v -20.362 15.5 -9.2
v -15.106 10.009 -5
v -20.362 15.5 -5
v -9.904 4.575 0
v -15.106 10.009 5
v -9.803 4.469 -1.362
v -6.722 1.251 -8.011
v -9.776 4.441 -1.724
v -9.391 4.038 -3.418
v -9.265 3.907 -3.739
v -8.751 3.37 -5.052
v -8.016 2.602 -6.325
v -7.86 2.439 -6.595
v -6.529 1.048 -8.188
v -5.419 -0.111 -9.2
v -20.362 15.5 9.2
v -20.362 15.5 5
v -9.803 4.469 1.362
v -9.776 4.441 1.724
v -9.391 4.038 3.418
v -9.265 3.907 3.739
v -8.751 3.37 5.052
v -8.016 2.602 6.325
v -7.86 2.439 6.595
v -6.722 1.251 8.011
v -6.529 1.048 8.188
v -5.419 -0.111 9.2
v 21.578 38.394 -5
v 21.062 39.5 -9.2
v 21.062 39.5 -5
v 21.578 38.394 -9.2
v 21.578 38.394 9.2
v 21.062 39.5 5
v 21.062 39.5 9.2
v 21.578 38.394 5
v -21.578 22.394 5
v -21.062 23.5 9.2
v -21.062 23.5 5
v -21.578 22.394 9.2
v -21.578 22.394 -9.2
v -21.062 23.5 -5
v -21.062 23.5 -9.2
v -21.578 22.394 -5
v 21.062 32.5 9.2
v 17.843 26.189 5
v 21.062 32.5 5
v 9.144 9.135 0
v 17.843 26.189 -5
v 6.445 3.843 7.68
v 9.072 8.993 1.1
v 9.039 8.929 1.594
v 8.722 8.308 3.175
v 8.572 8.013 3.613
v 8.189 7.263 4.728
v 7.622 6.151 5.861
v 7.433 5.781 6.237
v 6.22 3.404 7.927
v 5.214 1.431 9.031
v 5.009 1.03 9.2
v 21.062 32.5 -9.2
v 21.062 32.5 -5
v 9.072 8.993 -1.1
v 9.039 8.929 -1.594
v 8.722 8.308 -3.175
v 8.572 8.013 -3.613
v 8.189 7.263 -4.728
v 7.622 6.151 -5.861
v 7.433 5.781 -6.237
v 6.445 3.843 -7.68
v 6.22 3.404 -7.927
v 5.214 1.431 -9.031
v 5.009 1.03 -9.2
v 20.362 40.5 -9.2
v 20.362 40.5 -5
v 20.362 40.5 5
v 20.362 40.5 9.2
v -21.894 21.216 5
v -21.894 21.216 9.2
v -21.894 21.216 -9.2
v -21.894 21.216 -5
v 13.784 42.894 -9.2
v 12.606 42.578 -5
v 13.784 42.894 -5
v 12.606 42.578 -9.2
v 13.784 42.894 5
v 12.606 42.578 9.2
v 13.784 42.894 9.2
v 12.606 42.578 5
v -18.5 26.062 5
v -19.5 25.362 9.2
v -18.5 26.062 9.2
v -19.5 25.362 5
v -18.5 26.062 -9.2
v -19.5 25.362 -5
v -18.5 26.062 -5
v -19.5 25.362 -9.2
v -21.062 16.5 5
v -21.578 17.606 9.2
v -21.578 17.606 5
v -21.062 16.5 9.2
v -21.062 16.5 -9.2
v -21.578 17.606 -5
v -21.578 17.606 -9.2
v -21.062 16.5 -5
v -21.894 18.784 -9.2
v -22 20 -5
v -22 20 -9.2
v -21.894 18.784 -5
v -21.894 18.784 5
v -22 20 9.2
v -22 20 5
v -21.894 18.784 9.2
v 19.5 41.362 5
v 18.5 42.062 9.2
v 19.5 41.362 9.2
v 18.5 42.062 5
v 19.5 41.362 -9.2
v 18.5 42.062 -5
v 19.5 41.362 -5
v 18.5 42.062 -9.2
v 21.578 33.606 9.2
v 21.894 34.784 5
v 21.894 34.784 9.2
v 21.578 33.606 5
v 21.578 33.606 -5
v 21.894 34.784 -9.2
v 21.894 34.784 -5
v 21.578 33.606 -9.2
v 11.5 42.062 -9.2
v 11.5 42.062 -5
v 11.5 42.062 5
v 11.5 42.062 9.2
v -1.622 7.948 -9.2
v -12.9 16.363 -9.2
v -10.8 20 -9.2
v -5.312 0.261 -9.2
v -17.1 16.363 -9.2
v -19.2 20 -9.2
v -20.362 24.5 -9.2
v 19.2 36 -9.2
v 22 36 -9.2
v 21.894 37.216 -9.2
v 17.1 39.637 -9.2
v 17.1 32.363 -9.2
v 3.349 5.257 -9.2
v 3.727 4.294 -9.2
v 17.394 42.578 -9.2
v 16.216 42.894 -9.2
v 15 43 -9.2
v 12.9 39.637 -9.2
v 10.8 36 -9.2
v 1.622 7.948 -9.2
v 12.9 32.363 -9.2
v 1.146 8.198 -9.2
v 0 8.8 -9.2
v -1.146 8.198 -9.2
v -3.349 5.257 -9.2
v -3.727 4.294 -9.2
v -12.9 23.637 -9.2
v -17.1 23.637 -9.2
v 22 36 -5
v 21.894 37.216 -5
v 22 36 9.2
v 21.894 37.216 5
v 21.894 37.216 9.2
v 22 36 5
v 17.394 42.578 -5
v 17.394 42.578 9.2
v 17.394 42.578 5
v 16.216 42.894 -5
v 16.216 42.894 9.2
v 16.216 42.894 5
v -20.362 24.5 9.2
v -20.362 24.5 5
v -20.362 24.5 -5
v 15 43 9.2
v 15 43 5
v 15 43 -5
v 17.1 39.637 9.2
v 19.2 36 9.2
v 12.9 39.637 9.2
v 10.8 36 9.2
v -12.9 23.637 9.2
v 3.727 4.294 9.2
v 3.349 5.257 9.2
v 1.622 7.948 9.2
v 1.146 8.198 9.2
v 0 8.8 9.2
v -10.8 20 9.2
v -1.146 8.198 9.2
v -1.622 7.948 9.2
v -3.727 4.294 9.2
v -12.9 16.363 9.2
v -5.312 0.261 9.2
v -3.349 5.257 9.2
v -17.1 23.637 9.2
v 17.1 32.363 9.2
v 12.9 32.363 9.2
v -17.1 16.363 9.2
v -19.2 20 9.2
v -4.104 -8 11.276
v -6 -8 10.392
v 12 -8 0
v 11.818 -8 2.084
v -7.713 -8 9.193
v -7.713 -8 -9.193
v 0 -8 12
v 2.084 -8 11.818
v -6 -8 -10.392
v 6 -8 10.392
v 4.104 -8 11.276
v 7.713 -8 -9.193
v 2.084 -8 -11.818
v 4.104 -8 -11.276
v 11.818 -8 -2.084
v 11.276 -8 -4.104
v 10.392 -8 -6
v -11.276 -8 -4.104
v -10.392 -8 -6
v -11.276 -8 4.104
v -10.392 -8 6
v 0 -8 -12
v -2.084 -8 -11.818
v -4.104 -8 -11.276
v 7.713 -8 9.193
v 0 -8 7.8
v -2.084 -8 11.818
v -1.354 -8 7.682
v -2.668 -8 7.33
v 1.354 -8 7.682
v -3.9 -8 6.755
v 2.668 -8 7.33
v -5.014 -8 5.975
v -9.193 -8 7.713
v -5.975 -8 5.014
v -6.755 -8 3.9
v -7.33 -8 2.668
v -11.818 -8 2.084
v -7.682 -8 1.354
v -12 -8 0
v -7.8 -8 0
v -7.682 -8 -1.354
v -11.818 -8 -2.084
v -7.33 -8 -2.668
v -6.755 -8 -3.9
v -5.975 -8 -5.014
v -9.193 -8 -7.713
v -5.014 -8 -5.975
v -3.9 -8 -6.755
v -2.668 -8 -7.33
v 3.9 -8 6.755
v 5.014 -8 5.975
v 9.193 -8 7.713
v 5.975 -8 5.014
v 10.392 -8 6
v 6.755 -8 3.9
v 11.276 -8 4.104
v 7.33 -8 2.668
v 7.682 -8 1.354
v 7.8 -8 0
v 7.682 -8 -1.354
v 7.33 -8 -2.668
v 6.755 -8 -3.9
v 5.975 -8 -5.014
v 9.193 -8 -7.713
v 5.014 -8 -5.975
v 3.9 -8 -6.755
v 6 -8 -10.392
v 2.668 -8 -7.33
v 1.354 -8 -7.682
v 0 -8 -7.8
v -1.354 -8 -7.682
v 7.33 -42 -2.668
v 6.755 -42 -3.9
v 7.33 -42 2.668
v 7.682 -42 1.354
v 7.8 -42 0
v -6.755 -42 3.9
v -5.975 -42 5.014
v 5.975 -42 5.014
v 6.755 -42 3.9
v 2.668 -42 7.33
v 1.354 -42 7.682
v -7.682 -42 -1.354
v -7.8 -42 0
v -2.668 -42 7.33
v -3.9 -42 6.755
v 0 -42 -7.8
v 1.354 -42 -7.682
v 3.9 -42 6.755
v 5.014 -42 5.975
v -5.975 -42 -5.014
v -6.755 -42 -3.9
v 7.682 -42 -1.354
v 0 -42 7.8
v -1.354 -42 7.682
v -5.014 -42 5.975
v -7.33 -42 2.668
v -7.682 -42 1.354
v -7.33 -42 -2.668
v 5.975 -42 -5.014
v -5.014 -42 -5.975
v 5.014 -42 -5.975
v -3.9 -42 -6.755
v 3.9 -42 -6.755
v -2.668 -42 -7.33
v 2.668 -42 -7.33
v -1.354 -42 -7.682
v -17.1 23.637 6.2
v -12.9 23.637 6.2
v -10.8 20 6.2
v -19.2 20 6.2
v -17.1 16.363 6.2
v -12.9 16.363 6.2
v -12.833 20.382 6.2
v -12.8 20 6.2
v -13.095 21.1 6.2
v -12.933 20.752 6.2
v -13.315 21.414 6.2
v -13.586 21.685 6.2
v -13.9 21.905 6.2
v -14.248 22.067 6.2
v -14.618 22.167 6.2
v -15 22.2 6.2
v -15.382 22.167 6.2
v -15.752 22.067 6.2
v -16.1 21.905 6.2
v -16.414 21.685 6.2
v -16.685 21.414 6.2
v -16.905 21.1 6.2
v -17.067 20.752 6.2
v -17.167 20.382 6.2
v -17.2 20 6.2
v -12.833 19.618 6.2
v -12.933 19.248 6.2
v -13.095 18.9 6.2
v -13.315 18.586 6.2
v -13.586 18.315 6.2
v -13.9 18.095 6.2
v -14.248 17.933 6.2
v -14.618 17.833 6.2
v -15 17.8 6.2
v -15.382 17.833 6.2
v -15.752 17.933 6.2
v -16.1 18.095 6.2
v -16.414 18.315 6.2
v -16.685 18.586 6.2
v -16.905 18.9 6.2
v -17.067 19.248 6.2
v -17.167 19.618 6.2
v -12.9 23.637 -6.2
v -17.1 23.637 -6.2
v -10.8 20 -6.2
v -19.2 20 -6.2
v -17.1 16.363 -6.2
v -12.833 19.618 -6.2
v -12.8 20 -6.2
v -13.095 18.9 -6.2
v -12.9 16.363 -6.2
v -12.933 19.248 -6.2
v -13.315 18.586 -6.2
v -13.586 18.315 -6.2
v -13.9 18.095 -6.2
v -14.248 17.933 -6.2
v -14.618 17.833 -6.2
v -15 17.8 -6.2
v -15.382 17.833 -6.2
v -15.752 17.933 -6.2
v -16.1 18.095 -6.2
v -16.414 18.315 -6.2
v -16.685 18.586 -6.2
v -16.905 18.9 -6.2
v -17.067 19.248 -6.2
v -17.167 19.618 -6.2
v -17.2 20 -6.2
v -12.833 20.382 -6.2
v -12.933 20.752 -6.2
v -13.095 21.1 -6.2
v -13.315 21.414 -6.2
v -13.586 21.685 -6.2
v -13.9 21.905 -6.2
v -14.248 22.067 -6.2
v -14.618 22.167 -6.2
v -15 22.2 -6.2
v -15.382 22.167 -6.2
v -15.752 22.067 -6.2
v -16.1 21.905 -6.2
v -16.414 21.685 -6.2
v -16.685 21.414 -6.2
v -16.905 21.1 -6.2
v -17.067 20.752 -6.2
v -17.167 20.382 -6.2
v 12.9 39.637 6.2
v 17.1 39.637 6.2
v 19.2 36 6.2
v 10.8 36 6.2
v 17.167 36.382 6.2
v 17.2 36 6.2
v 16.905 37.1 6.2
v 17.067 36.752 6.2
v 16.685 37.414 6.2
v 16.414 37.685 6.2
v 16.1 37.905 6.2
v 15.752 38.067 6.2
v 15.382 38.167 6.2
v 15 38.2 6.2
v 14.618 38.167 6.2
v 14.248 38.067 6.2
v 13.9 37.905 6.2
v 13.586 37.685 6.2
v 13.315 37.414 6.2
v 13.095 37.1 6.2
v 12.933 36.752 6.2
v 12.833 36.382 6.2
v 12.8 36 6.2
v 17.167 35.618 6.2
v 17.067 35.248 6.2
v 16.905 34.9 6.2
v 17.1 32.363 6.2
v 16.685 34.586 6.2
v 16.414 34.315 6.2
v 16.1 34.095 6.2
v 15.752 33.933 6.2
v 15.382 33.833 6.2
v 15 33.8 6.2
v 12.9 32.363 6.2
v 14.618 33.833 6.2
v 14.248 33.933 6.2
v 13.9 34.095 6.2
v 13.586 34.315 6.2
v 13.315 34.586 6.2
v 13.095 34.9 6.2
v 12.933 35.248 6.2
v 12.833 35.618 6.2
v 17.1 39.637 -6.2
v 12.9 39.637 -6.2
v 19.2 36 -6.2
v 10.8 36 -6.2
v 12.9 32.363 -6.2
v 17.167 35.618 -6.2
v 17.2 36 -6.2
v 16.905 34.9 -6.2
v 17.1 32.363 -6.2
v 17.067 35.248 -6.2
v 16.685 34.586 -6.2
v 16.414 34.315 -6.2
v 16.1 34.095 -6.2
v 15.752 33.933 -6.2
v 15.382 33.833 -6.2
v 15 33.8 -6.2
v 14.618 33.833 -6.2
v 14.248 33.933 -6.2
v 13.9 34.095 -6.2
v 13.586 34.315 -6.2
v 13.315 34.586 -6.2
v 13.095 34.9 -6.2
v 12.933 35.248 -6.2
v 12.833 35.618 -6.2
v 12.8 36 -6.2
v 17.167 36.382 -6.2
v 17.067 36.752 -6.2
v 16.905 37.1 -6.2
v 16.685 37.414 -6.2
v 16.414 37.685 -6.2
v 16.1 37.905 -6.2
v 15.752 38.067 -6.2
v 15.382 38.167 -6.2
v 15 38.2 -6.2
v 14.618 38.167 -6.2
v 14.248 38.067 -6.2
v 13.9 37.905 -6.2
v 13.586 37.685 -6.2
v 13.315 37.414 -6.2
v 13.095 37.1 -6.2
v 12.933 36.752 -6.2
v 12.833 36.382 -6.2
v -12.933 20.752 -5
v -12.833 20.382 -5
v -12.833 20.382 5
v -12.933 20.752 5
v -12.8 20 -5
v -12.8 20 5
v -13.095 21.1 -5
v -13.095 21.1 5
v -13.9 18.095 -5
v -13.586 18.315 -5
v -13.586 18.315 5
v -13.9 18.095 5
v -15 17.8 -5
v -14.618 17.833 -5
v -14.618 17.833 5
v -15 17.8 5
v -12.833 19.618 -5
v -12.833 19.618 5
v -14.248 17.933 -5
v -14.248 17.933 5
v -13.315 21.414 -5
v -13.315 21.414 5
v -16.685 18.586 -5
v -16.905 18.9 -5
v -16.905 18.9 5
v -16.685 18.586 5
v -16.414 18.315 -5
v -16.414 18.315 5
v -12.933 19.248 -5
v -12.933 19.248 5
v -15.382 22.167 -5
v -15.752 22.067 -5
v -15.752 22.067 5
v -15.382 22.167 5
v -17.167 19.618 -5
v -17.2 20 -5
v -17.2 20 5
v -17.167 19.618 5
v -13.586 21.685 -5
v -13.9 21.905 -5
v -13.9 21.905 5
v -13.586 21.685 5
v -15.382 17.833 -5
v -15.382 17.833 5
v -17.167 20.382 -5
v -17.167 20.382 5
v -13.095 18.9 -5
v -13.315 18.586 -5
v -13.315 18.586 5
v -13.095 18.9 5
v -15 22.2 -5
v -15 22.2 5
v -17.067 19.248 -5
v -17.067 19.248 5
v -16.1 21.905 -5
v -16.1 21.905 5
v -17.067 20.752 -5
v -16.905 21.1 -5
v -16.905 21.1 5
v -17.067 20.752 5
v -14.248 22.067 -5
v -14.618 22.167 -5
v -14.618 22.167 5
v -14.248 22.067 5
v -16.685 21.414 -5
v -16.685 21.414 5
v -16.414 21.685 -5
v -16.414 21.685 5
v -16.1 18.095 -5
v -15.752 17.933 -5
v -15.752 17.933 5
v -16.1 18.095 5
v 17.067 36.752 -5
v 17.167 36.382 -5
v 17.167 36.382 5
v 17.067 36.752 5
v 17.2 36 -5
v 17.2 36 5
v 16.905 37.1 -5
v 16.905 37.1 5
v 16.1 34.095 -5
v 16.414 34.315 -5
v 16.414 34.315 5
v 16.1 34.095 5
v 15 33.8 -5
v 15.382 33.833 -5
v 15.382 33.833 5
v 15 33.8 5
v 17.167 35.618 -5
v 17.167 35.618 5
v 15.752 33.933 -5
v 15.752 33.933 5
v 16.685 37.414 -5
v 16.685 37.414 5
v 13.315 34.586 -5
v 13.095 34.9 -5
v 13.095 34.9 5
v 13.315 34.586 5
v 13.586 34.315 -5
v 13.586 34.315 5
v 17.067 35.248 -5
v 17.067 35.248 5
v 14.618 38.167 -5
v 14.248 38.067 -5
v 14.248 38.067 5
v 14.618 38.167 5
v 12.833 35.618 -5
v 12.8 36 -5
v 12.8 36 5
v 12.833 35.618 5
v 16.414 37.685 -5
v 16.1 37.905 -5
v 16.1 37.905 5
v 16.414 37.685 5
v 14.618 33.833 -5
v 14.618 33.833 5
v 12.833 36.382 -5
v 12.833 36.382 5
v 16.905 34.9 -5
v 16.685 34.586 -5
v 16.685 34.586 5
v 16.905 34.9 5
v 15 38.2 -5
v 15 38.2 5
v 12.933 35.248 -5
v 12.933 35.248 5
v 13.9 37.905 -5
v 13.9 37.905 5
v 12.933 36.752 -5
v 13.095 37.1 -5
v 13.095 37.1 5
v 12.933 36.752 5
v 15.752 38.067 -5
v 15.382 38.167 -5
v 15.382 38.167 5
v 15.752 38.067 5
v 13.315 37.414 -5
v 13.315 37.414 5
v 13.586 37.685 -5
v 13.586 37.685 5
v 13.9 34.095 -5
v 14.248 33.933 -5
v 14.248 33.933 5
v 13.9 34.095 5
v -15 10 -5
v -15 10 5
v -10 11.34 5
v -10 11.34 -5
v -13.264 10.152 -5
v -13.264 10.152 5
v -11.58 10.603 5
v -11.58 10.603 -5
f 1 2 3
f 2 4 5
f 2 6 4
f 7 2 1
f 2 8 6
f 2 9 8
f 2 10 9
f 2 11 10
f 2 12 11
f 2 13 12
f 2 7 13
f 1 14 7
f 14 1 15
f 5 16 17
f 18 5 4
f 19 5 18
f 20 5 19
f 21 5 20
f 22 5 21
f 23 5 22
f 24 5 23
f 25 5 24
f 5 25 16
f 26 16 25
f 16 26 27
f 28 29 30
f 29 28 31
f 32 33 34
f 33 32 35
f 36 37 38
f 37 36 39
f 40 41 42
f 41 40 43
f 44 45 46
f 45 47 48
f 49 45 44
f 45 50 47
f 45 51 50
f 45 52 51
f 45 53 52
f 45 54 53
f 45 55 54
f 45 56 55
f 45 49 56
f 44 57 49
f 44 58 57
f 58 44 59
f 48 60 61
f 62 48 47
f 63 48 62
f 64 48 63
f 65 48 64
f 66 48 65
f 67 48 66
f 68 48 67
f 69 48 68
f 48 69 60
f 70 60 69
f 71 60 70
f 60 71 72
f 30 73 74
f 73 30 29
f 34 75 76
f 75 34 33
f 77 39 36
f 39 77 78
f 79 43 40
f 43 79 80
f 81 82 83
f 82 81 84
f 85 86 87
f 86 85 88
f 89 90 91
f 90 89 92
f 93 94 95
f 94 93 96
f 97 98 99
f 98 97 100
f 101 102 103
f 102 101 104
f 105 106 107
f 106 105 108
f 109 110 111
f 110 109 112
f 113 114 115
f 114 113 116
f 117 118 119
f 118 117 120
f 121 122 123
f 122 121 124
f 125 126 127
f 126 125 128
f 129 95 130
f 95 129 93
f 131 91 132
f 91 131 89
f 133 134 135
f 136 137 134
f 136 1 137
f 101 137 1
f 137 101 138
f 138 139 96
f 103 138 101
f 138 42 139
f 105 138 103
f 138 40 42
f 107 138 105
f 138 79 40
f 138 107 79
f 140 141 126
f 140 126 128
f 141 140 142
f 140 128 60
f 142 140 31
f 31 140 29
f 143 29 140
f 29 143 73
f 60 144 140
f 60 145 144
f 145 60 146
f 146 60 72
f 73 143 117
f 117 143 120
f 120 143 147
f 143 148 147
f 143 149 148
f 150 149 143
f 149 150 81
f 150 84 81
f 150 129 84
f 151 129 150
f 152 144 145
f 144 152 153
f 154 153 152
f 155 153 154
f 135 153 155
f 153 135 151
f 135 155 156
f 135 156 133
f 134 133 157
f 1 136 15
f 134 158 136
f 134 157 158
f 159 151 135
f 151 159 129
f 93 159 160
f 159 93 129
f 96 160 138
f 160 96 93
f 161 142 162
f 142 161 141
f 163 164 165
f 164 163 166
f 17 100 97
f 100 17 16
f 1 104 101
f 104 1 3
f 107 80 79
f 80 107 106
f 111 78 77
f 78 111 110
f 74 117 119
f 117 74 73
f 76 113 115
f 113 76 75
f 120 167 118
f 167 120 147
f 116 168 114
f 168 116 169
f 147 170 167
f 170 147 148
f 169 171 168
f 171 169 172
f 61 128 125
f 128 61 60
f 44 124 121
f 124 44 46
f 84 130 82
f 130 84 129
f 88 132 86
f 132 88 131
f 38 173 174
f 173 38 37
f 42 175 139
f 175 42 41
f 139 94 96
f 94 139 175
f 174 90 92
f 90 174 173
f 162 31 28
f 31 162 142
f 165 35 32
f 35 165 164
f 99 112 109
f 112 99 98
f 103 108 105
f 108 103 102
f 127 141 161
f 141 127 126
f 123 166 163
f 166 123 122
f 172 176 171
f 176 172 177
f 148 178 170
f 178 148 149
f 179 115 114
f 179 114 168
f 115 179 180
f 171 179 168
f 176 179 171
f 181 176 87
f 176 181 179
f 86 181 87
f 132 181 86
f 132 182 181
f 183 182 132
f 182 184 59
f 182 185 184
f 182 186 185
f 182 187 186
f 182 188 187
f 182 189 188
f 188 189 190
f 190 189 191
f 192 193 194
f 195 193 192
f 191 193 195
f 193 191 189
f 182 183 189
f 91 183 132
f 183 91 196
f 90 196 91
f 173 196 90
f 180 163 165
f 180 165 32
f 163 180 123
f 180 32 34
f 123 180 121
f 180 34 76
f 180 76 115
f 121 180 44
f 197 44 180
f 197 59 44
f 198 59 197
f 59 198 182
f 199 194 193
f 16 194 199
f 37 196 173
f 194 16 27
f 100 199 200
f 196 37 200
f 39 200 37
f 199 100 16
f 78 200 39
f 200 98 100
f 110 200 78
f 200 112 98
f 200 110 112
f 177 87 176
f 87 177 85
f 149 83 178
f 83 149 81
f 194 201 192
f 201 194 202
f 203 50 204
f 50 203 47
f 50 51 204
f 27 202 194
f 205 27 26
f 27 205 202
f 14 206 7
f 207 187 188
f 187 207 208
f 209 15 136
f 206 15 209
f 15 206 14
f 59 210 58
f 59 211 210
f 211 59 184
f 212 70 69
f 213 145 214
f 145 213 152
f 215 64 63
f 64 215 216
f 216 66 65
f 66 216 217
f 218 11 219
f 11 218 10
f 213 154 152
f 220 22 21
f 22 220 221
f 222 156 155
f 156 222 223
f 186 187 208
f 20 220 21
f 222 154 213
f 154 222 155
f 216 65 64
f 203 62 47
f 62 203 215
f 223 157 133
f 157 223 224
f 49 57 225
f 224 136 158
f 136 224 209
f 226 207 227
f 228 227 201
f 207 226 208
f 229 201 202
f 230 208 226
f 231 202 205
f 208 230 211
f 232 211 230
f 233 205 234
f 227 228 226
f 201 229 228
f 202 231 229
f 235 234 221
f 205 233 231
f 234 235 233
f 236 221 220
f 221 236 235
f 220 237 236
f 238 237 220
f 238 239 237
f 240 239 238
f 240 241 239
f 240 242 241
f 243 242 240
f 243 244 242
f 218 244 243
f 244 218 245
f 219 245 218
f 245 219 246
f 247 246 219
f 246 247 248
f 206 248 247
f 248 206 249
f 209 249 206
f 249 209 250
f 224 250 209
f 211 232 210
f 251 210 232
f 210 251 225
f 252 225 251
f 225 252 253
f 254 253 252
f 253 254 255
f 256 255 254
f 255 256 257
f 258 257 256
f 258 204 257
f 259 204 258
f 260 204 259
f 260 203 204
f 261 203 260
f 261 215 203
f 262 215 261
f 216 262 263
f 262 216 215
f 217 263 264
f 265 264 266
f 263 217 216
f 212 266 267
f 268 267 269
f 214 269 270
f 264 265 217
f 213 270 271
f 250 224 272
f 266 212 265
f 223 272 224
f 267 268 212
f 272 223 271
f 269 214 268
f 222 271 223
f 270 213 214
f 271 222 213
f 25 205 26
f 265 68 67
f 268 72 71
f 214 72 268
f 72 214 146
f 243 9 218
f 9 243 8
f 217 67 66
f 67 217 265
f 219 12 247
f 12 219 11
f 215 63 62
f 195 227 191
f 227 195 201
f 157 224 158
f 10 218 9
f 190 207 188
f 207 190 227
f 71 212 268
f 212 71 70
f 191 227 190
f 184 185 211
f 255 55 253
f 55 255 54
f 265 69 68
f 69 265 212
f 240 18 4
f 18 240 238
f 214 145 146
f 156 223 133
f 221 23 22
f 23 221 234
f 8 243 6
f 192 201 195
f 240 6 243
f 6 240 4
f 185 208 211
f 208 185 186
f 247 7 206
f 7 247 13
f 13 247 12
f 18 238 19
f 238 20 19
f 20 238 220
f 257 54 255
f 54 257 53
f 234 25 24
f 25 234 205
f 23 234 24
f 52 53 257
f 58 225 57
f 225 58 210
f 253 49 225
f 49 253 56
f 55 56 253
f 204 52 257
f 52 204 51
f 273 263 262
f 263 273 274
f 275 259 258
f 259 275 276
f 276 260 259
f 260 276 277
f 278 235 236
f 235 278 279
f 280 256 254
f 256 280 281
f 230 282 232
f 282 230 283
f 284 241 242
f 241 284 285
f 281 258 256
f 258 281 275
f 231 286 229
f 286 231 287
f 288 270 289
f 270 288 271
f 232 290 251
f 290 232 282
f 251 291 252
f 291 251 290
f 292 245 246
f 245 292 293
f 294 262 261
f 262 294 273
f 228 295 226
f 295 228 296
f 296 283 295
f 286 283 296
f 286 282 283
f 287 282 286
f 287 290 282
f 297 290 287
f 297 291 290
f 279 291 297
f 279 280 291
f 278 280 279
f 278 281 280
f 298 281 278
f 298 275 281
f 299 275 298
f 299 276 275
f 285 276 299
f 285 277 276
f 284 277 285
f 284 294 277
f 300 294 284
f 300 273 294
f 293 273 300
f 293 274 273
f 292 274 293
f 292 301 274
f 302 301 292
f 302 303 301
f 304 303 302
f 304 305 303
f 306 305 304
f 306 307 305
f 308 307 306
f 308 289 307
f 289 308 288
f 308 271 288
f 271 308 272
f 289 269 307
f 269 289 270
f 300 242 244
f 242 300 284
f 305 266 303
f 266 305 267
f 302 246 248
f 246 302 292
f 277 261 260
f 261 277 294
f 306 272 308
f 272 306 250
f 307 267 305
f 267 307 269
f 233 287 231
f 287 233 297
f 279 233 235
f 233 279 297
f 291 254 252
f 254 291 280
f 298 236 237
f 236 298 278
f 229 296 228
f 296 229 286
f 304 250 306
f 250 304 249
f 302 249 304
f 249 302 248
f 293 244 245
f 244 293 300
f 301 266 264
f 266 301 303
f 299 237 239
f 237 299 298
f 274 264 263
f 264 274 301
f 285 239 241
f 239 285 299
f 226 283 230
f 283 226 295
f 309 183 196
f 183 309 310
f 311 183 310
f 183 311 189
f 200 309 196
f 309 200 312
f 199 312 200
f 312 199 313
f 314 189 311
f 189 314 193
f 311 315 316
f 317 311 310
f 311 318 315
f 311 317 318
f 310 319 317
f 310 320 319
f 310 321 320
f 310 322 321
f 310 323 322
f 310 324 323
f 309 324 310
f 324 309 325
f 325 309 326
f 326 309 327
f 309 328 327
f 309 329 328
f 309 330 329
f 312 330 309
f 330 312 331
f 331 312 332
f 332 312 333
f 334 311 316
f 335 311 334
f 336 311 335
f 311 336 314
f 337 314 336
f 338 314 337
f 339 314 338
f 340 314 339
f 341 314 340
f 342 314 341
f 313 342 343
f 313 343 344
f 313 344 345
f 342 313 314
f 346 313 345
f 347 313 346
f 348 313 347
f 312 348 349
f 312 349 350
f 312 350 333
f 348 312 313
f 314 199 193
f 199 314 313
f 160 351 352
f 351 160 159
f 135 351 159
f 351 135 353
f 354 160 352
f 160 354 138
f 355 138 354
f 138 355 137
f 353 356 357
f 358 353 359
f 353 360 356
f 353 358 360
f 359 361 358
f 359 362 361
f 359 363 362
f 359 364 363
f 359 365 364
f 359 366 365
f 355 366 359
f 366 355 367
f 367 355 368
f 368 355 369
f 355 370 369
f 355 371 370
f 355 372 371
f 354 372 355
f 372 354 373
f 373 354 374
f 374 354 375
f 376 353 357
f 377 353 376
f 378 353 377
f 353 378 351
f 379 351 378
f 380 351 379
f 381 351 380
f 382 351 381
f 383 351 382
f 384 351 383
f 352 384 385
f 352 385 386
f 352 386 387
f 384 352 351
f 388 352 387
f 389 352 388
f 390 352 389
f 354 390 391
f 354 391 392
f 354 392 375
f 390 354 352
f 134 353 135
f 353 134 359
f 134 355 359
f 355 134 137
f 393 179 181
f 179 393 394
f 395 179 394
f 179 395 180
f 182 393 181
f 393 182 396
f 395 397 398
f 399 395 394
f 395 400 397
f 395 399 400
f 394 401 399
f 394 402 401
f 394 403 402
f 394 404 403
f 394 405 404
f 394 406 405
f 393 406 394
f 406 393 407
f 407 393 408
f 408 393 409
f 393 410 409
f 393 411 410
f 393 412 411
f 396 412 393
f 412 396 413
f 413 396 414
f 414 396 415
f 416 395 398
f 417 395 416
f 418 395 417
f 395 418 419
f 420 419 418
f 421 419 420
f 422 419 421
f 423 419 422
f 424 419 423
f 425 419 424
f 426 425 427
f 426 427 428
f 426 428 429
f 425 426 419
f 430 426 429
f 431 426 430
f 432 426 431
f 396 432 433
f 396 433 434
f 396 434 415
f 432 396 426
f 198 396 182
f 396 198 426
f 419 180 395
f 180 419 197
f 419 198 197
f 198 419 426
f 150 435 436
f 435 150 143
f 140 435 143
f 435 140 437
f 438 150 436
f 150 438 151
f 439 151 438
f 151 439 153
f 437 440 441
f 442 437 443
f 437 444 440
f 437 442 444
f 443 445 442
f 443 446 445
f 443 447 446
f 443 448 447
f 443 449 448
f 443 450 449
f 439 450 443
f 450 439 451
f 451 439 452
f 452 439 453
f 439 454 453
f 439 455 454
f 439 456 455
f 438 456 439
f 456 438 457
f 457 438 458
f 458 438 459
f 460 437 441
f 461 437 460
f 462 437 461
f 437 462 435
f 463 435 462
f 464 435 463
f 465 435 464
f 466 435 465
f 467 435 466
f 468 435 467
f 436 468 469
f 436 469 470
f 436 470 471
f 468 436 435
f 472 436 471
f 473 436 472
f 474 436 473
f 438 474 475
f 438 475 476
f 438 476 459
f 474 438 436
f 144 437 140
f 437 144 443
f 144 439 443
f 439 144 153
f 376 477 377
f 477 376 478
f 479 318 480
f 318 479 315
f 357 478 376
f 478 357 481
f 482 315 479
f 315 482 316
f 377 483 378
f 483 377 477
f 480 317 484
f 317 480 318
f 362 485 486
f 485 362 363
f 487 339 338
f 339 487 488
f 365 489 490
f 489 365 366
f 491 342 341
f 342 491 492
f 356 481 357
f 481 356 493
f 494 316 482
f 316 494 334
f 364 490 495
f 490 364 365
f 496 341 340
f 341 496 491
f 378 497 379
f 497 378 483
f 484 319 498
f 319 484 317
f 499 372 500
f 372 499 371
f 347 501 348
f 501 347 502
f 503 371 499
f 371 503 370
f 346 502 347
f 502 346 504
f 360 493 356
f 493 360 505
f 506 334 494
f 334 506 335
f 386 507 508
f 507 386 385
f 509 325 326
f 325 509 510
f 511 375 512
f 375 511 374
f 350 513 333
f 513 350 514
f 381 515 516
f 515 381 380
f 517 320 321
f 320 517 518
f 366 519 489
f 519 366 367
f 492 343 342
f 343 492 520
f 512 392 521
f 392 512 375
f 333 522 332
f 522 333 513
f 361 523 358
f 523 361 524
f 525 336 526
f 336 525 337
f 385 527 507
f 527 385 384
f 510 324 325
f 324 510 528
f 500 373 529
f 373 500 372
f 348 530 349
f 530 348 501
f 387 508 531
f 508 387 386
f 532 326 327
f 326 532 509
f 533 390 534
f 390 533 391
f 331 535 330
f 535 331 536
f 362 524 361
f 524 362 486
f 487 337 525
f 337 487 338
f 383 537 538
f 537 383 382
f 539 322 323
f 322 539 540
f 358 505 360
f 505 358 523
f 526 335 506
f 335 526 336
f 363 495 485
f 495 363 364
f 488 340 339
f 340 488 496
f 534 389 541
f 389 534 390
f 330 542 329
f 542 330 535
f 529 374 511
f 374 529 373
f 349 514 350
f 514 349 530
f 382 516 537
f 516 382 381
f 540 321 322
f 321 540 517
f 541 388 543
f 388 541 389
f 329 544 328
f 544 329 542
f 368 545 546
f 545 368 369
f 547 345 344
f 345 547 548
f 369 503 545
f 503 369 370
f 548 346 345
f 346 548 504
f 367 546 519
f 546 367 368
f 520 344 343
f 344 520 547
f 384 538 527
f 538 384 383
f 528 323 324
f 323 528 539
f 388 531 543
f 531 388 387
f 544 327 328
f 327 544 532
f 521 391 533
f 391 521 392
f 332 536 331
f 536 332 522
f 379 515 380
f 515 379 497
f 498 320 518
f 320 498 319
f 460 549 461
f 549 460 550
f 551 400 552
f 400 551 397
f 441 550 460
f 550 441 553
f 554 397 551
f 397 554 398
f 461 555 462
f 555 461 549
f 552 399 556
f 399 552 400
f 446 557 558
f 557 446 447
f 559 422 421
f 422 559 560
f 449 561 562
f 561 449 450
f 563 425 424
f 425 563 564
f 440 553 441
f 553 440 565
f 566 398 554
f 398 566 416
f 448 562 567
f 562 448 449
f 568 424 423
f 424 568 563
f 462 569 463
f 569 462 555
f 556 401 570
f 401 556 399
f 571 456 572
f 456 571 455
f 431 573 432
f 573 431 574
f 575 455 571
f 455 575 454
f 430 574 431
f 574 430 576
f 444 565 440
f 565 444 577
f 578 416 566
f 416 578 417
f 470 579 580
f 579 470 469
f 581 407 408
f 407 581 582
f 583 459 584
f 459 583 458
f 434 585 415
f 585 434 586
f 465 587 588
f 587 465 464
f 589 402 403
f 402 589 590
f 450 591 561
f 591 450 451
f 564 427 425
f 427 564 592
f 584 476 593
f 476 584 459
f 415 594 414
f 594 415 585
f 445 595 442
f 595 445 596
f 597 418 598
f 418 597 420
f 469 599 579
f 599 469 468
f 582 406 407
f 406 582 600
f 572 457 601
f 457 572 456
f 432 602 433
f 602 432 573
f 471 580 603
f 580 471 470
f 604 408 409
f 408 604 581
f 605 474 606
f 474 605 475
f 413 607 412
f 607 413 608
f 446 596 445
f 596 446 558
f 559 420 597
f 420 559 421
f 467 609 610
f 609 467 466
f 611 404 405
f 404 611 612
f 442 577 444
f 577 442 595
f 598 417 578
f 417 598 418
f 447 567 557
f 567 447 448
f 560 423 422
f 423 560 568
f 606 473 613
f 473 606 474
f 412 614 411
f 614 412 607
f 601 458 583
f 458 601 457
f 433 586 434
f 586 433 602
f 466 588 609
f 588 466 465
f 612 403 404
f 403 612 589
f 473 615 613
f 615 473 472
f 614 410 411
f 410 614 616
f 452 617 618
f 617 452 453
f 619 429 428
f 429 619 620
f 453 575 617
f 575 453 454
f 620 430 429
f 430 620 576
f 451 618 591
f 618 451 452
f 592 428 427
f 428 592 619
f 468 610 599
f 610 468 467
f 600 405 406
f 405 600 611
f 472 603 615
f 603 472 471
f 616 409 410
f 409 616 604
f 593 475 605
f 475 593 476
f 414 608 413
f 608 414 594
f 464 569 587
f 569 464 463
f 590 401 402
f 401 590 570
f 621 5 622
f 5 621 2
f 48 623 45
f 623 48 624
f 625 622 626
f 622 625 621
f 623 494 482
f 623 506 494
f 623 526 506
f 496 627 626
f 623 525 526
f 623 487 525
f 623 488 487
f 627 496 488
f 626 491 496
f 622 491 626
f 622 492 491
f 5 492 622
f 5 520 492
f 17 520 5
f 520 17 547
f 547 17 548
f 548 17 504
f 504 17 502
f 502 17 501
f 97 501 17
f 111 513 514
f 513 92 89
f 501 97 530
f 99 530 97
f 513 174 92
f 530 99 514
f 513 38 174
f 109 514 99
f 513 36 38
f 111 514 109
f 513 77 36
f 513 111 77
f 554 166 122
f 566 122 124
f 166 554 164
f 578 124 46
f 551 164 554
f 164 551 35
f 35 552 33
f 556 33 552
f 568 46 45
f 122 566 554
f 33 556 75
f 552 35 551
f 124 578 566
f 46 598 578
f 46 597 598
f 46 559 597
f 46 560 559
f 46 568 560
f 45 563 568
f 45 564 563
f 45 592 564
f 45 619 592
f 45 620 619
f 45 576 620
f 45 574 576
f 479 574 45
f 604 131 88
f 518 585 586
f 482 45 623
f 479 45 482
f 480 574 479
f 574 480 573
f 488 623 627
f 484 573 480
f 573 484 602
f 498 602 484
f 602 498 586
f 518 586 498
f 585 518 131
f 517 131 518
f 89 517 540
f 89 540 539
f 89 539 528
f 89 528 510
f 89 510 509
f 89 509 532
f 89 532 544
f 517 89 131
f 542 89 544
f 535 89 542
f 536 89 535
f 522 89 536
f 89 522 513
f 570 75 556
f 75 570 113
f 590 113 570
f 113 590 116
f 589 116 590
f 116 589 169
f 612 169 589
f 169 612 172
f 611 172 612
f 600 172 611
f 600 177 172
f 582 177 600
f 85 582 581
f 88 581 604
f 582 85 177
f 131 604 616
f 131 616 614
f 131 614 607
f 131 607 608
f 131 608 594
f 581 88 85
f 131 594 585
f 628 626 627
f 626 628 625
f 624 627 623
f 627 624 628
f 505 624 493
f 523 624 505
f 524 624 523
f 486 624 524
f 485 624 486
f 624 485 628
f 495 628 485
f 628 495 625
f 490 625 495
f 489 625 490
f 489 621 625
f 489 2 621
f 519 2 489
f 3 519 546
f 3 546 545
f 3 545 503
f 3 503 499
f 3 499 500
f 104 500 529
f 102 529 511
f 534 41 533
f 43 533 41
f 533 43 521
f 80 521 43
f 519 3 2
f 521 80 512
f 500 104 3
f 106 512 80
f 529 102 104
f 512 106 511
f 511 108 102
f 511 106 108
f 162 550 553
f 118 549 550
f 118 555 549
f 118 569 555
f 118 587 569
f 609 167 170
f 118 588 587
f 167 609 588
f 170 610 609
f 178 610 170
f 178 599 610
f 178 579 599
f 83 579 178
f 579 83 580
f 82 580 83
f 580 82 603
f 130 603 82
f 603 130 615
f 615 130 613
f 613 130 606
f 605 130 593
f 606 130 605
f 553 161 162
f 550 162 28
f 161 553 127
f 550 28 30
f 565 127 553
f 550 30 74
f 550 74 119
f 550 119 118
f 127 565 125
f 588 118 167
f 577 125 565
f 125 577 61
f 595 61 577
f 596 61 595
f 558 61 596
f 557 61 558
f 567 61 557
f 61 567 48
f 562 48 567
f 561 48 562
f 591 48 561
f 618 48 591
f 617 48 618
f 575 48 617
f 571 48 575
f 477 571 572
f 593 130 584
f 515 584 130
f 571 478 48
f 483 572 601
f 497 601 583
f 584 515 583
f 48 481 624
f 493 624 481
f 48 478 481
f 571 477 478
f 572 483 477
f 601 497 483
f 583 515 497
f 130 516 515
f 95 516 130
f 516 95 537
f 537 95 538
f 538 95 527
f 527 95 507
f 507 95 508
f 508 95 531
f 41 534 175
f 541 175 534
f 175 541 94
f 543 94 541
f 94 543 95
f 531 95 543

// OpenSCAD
gaika = 3.6;
gaika = 4.2;
   
difference(){   
    union(){   
        hull(){   
            translate([-15, 20,0]) cylinder(18.4, 7, 7,$fn=36,center = true);
            translate([15, 16+20,0]) cylinder(18.4, 7, 7,$fn=36,center = true);
            cylinder(18.4, 4, 4,$fn=36,center = true);
        };
        translate([0,10,0]) rotate([90,0,0])cylinder(36,6, 12,$fn=36,center = true);
        translate([0,-21,0]) rotate([90,0,0])cylinder(42, 7.8, 7.8,$fn=36,center = true);
    }

    translate([-15, 20,8.2]) cylinder(4, gaika, gaika,$fn=6,center = true);
    translate([-15, 20,-8.2]) cylinder(4, gaika, gaika,$fn=6,center = true);
    translate([15, 16+20,8.2]) cylinder(4, gaika, gaika,$fn=6,center = true);
    translate([15, 16+20,-8.2]) cylinder(4, gaika, gaika,$fn=6,center = true);
    
    translate([-15, 20,0]) cylinder(20, 2.2, 2.2,$fn=36,center = true);
    translate([15, 16+20,0]) cylinder(20, 2.2, 2.2,$fn=36,center = true);

    hull(){
        translate([-15, 20,0]) cylinder(10, 10, 10,$fn=36,center = true);
        translate([15, 16+20,0]) cylinder(10, 10, 10,$fn=36,center = true);
    }
}
